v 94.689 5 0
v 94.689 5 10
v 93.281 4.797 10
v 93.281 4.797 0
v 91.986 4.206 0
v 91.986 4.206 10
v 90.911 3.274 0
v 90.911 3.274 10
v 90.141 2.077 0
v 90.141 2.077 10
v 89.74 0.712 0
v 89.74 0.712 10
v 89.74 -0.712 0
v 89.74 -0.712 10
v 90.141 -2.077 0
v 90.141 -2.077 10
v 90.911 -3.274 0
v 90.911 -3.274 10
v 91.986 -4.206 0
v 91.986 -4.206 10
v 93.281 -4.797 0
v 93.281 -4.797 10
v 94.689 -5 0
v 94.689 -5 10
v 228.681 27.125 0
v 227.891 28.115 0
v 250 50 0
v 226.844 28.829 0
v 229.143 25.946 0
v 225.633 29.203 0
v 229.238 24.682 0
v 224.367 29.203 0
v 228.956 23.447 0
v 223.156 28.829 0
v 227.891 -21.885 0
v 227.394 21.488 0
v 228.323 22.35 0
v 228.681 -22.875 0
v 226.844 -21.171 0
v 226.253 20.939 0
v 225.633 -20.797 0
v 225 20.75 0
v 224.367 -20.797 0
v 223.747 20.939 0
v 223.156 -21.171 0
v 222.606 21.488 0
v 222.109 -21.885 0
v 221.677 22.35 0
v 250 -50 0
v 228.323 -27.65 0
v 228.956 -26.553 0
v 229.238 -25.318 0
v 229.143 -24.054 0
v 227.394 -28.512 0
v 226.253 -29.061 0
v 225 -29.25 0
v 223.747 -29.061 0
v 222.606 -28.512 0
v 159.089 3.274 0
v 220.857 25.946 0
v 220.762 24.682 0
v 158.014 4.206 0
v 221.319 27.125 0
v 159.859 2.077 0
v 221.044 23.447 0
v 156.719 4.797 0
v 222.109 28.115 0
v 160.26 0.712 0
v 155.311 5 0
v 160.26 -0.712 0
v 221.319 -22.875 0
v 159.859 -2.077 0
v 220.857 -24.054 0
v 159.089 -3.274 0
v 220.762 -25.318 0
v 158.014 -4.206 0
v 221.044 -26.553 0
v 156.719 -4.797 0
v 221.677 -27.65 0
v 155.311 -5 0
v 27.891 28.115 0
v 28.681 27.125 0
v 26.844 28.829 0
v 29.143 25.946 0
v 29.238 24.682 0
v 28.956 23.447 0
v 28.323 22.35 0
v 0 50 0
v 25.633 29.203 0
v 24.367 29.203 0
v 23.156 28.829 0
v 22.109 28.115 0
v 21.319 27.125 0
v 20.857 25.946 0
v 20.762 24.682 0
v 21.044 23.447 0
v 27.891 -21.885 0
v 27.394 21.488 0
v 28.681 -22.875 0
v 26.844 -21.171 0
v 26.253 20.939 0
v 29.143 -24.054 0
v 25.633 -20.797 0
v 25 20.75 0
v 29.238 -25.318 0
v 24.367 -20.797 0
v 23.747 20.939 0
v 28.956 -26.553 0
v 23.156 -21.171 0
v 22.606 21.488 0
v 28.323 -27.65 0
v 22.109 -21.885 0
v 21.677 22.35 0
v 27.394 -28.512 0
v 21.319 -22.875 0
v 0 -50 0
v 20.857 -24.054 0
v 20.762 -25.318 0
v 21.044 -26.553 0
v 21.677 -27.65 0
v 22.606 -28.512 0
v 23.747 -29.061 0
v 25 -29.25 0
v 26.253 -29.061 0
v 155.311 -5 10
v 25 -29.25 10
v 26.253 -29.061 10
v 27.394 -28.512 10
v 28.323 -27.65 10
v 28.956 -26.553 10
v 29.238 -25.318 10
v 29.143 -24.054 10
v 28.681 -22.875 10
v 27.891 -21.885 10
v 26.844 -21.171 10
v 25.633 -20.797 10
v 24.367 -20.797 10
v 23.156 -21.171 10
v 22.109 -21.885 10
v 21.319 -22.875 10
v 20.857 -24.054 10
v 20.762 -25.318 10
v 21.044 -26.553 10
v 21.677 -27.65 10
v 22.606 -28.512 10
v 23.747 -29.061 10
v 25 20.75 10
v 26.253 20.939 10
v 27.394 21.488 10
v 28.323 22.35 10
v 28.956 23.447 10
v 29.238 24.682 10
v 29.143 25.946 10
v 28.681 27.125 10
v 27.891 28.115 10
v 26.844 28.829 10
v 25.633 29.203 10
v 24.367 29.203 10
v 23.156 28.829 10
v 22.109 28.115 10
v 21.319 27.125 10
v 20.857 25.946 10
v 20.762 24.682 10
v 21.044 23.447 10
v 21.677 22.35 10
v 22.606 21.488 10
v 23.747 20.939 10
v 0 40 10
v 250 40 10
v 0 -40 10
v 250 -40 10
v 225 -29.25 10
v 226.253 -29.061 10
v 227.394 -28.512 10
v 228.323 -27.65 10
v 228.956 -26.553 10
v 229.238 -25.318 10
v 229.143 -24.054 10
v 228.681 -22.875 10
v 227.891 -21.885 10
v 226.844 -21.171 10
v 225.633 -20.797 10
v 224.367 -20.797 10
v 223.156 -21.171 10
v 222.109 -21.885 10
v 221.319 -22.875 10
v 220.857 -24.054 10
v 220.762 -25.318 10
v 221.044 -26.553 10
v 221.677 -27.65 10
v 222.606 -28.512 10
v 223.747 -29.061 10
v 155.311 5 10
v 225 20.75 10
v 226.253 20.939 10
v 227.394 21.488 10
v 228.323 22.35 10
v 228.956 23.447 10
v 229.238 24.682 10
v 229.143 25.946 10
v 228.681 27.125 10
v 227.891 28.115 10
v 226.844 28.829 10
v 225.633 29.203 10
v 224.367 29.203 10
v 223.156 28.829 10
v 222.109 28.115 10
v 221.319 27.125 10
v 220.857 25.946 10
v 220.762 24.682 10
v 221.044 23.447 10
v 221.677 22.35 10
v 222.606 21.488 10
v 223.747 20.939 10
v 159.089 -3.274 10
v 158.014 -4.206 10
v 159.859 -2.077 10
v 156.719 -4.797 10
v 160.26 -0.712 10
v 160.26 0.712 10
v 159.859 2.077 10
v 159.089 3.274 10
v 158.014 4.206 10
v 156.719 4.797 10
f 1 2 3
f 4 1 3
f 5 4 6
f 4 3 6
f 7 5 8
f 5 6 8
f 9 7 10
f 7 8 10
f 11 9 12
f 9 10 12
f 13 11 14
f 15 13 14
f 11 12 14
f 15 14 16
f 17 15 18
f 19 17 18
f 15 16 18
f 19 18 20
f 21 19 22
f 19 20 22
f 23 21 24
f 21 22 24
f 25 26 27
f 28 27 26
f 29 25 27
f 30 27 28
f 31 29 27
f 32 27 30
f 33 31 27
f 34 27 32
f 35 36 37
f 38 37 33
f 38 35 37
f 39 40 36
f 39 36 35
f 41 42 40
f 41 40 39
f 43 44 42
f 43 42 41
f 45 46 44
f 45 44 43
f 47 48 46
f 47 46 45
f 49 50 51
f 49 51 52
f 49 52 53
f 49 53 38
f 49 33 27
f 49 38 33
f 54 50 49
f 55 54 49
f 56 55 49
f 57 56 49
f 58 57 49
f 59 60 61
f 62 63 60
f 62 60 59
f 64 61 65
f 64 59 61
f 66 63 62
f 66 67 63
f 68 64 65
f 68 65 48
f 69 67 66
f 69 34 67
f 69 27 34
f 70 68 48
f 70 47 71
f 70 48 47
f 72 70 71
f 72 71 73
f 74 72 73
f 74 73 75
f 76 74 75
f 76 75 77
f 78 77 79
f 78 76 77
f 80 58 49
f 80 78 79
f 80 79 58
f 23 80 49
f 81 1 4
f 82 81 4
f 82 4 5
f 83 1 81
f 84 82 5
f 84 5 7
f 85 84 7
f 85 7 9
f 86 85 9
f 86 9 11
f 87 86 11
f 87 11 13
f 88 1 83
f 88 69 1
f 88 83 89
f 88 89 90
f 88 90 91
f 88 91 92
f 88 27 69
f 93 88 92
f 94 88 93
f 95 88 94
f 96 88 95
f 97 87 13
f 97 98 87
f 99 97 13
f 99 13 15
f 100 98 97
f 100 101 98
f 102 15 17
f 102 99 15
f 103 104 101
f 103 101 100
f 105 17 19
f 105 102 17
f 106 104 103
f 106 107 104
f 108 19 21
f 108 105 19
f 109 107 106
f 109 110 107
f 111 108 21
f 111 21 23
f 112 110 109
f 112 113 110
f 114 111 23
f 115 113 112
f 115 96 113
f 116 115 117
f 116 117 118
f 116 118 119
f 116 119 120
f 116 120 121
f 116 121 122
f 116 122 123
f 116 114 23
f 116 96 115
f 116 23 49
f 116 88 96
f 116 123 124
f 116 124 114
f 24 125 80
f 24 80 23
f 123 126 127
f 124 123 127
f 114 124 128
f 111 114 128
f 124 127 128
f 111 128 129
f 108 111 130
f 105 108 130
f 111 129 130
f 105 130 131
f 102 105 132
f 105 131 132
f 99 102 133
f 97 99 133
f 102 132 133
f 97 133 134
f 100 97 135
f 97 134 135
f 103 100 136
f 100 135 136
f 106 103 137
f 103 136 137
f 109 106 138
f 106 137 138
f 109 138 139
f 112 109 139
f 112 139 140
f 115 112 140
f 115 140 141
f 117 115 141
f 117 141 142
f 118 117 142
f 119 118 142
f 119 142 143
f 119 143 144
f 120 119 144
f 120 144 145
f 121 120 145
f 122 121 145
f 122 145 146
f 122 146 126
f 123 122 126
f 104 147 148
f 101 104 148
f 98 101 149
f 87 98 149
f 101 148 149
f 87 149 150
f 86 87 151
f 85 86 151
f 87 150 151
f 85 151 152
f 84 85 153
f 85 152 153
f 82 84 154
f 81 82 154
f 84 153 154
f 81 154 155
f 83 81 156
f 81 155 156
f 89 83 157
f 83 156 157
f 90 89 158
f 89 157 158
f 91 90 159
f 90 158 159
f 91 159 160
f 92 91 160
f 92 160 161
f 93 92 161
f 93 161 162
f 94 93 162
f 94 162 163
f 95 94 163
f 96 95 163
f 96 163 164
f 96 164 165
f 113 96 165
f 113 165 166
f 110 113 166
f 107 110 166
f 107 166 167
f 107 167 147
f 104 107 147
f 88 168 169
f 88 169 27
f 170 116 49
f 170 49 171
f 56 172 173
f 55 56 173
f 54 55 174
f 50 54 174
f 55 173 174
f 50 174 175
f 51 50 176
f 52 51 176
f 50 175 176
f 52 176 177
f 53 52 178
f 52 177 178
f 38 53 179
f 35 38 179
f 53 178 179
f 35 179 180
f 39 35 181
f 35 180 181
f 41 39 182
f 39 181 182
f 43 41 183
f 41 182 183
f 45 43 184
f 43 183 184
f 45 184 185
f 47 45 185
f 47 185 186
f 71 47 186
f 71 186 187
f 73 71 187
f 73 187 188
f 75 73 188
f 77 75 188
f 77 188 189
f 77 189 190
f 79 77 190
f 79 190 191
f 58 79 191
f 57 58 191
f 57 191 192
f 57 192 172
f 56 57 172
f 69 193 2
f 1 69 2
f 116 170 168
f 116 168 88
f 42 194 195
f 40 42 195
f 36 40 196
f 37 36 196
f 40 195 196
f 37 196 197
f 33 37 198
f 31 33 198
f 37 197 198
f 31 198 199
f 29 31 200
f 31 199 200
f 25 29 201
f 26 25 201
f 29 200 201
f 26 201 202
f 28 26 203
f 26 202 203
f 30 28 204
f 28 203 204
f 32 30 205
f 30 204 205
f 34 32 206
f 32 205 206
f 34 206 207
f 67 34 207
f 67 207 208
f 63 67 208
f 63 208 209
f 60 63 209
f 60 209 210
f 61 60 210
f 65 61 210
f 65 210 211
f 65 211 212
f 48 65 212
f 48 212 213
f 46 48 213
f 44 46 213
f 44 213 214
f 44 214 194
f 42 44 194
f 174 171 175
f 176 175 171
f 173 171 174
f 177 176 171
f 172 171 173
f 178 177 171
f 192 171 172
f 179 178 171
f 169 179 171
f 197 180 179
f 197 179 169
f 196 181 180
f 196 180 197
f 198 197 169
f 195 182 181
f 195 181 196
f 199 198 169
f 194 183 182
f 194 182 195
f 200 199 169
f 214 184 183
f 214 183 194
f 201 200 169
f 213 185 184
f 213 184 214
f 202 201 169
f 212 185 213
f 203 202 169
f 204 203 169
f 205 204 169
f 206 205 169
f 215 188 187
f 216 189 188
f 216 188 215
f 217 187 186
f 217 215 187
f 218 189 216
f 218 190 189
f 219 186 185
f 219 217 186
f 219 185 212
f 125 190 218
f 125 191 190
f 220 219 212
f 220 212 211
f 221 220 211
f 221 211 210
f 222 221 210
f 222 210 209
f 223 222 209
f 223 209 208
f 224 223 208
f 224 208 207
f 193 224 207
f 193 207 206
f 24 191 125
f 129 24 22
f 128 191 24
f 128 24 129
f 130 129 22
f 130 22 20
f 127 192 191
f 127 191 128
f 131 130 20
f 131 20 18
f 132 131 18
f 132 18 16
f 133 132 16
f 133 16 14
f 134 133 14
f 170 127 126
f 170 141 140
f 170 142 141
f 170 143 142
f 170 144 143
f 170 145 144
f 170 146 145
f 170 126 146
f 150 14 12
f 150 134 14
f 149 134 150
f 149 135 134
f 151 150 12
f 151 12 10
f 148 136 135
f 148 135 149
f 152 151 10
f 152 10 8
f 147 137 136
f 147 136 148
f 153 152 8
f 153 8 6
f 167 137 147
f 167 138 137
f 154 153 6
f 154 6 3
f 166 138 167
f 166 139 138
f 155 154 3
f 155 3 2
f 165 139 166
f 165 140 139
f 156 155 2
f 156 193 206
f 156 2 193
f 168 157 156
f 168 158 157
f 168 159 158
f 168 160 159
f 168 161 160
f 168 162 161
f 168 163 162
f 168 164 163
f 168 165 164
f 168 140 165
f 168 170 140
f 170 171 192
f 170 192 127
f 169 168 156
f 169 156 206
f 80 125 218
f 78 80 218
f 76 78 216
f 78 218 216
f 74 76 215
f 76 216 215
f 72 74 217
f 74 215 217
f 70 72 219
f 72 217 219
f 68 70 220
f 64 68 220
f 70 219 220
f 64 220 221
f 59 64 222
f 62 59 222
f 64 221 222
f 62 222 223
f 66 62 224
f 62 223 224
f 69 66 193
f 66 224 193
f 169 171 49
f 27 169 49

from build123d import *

# Parameters (mm, degrees)
PAD002_DEPTH    = 250
SKETCH004_R     = 4.25
HOLE_DEPTH      = 25
POCKET002_DEPTH = 10.001


with BuildPart() as part:
    # Sketch003 → Pad002 (new body)
    with BuildSketch(Plane.YZ):
        Polygon((-40, 10), (40, 10), (50, 0), (-50, 0), align=None)
    extrude(amount=PAD002_DEPTH)

    # Sketch004 (on Face2 of Pad002) → Hole (cut)
    with BuildSketch(Plane(origin=(0, 0, 10), x_dir=(0, -1, 0), z_dir=(0, 0, 1))):
        with Locations((-25, 25)):
            Circle(SKETCH004_R)
        with Locations((25, 25)):
            Circle(SKETCH004_R)
        with Locations((25, 225)):
            Circle(SKETCH004_R)
        with Locations((-25, 225)):
            Circle(SKETCH004_R)
    extrude(amount=-HOLE_DEPTH, mode=Mode.SUBTRACT)

    # Sketch005 (on Face3 of Hole) → Pocket002 (cut, through all)
    with BuildSketch(Plane(origin=(0, 0, 10), x_dir=(0, -1, 0), z_dir=(0, 0, 1))):
        with BuildLine():
            ThreePointArc((5, 155.310546), (0, 160.310546), (-5, 155.310546))
            Line((-5, 155.310546), (-5, 94.689454))
            ThreePointArc((-5, 94.689454), (0, 89.689454), (5, 94.689454))
            Line((5, 155.310546), (5, 94.689454))
        make_face()
    extrude(amount=-POCKET002_DEPTH, mode=Mode.SUBTRACT)


solid = part.part
